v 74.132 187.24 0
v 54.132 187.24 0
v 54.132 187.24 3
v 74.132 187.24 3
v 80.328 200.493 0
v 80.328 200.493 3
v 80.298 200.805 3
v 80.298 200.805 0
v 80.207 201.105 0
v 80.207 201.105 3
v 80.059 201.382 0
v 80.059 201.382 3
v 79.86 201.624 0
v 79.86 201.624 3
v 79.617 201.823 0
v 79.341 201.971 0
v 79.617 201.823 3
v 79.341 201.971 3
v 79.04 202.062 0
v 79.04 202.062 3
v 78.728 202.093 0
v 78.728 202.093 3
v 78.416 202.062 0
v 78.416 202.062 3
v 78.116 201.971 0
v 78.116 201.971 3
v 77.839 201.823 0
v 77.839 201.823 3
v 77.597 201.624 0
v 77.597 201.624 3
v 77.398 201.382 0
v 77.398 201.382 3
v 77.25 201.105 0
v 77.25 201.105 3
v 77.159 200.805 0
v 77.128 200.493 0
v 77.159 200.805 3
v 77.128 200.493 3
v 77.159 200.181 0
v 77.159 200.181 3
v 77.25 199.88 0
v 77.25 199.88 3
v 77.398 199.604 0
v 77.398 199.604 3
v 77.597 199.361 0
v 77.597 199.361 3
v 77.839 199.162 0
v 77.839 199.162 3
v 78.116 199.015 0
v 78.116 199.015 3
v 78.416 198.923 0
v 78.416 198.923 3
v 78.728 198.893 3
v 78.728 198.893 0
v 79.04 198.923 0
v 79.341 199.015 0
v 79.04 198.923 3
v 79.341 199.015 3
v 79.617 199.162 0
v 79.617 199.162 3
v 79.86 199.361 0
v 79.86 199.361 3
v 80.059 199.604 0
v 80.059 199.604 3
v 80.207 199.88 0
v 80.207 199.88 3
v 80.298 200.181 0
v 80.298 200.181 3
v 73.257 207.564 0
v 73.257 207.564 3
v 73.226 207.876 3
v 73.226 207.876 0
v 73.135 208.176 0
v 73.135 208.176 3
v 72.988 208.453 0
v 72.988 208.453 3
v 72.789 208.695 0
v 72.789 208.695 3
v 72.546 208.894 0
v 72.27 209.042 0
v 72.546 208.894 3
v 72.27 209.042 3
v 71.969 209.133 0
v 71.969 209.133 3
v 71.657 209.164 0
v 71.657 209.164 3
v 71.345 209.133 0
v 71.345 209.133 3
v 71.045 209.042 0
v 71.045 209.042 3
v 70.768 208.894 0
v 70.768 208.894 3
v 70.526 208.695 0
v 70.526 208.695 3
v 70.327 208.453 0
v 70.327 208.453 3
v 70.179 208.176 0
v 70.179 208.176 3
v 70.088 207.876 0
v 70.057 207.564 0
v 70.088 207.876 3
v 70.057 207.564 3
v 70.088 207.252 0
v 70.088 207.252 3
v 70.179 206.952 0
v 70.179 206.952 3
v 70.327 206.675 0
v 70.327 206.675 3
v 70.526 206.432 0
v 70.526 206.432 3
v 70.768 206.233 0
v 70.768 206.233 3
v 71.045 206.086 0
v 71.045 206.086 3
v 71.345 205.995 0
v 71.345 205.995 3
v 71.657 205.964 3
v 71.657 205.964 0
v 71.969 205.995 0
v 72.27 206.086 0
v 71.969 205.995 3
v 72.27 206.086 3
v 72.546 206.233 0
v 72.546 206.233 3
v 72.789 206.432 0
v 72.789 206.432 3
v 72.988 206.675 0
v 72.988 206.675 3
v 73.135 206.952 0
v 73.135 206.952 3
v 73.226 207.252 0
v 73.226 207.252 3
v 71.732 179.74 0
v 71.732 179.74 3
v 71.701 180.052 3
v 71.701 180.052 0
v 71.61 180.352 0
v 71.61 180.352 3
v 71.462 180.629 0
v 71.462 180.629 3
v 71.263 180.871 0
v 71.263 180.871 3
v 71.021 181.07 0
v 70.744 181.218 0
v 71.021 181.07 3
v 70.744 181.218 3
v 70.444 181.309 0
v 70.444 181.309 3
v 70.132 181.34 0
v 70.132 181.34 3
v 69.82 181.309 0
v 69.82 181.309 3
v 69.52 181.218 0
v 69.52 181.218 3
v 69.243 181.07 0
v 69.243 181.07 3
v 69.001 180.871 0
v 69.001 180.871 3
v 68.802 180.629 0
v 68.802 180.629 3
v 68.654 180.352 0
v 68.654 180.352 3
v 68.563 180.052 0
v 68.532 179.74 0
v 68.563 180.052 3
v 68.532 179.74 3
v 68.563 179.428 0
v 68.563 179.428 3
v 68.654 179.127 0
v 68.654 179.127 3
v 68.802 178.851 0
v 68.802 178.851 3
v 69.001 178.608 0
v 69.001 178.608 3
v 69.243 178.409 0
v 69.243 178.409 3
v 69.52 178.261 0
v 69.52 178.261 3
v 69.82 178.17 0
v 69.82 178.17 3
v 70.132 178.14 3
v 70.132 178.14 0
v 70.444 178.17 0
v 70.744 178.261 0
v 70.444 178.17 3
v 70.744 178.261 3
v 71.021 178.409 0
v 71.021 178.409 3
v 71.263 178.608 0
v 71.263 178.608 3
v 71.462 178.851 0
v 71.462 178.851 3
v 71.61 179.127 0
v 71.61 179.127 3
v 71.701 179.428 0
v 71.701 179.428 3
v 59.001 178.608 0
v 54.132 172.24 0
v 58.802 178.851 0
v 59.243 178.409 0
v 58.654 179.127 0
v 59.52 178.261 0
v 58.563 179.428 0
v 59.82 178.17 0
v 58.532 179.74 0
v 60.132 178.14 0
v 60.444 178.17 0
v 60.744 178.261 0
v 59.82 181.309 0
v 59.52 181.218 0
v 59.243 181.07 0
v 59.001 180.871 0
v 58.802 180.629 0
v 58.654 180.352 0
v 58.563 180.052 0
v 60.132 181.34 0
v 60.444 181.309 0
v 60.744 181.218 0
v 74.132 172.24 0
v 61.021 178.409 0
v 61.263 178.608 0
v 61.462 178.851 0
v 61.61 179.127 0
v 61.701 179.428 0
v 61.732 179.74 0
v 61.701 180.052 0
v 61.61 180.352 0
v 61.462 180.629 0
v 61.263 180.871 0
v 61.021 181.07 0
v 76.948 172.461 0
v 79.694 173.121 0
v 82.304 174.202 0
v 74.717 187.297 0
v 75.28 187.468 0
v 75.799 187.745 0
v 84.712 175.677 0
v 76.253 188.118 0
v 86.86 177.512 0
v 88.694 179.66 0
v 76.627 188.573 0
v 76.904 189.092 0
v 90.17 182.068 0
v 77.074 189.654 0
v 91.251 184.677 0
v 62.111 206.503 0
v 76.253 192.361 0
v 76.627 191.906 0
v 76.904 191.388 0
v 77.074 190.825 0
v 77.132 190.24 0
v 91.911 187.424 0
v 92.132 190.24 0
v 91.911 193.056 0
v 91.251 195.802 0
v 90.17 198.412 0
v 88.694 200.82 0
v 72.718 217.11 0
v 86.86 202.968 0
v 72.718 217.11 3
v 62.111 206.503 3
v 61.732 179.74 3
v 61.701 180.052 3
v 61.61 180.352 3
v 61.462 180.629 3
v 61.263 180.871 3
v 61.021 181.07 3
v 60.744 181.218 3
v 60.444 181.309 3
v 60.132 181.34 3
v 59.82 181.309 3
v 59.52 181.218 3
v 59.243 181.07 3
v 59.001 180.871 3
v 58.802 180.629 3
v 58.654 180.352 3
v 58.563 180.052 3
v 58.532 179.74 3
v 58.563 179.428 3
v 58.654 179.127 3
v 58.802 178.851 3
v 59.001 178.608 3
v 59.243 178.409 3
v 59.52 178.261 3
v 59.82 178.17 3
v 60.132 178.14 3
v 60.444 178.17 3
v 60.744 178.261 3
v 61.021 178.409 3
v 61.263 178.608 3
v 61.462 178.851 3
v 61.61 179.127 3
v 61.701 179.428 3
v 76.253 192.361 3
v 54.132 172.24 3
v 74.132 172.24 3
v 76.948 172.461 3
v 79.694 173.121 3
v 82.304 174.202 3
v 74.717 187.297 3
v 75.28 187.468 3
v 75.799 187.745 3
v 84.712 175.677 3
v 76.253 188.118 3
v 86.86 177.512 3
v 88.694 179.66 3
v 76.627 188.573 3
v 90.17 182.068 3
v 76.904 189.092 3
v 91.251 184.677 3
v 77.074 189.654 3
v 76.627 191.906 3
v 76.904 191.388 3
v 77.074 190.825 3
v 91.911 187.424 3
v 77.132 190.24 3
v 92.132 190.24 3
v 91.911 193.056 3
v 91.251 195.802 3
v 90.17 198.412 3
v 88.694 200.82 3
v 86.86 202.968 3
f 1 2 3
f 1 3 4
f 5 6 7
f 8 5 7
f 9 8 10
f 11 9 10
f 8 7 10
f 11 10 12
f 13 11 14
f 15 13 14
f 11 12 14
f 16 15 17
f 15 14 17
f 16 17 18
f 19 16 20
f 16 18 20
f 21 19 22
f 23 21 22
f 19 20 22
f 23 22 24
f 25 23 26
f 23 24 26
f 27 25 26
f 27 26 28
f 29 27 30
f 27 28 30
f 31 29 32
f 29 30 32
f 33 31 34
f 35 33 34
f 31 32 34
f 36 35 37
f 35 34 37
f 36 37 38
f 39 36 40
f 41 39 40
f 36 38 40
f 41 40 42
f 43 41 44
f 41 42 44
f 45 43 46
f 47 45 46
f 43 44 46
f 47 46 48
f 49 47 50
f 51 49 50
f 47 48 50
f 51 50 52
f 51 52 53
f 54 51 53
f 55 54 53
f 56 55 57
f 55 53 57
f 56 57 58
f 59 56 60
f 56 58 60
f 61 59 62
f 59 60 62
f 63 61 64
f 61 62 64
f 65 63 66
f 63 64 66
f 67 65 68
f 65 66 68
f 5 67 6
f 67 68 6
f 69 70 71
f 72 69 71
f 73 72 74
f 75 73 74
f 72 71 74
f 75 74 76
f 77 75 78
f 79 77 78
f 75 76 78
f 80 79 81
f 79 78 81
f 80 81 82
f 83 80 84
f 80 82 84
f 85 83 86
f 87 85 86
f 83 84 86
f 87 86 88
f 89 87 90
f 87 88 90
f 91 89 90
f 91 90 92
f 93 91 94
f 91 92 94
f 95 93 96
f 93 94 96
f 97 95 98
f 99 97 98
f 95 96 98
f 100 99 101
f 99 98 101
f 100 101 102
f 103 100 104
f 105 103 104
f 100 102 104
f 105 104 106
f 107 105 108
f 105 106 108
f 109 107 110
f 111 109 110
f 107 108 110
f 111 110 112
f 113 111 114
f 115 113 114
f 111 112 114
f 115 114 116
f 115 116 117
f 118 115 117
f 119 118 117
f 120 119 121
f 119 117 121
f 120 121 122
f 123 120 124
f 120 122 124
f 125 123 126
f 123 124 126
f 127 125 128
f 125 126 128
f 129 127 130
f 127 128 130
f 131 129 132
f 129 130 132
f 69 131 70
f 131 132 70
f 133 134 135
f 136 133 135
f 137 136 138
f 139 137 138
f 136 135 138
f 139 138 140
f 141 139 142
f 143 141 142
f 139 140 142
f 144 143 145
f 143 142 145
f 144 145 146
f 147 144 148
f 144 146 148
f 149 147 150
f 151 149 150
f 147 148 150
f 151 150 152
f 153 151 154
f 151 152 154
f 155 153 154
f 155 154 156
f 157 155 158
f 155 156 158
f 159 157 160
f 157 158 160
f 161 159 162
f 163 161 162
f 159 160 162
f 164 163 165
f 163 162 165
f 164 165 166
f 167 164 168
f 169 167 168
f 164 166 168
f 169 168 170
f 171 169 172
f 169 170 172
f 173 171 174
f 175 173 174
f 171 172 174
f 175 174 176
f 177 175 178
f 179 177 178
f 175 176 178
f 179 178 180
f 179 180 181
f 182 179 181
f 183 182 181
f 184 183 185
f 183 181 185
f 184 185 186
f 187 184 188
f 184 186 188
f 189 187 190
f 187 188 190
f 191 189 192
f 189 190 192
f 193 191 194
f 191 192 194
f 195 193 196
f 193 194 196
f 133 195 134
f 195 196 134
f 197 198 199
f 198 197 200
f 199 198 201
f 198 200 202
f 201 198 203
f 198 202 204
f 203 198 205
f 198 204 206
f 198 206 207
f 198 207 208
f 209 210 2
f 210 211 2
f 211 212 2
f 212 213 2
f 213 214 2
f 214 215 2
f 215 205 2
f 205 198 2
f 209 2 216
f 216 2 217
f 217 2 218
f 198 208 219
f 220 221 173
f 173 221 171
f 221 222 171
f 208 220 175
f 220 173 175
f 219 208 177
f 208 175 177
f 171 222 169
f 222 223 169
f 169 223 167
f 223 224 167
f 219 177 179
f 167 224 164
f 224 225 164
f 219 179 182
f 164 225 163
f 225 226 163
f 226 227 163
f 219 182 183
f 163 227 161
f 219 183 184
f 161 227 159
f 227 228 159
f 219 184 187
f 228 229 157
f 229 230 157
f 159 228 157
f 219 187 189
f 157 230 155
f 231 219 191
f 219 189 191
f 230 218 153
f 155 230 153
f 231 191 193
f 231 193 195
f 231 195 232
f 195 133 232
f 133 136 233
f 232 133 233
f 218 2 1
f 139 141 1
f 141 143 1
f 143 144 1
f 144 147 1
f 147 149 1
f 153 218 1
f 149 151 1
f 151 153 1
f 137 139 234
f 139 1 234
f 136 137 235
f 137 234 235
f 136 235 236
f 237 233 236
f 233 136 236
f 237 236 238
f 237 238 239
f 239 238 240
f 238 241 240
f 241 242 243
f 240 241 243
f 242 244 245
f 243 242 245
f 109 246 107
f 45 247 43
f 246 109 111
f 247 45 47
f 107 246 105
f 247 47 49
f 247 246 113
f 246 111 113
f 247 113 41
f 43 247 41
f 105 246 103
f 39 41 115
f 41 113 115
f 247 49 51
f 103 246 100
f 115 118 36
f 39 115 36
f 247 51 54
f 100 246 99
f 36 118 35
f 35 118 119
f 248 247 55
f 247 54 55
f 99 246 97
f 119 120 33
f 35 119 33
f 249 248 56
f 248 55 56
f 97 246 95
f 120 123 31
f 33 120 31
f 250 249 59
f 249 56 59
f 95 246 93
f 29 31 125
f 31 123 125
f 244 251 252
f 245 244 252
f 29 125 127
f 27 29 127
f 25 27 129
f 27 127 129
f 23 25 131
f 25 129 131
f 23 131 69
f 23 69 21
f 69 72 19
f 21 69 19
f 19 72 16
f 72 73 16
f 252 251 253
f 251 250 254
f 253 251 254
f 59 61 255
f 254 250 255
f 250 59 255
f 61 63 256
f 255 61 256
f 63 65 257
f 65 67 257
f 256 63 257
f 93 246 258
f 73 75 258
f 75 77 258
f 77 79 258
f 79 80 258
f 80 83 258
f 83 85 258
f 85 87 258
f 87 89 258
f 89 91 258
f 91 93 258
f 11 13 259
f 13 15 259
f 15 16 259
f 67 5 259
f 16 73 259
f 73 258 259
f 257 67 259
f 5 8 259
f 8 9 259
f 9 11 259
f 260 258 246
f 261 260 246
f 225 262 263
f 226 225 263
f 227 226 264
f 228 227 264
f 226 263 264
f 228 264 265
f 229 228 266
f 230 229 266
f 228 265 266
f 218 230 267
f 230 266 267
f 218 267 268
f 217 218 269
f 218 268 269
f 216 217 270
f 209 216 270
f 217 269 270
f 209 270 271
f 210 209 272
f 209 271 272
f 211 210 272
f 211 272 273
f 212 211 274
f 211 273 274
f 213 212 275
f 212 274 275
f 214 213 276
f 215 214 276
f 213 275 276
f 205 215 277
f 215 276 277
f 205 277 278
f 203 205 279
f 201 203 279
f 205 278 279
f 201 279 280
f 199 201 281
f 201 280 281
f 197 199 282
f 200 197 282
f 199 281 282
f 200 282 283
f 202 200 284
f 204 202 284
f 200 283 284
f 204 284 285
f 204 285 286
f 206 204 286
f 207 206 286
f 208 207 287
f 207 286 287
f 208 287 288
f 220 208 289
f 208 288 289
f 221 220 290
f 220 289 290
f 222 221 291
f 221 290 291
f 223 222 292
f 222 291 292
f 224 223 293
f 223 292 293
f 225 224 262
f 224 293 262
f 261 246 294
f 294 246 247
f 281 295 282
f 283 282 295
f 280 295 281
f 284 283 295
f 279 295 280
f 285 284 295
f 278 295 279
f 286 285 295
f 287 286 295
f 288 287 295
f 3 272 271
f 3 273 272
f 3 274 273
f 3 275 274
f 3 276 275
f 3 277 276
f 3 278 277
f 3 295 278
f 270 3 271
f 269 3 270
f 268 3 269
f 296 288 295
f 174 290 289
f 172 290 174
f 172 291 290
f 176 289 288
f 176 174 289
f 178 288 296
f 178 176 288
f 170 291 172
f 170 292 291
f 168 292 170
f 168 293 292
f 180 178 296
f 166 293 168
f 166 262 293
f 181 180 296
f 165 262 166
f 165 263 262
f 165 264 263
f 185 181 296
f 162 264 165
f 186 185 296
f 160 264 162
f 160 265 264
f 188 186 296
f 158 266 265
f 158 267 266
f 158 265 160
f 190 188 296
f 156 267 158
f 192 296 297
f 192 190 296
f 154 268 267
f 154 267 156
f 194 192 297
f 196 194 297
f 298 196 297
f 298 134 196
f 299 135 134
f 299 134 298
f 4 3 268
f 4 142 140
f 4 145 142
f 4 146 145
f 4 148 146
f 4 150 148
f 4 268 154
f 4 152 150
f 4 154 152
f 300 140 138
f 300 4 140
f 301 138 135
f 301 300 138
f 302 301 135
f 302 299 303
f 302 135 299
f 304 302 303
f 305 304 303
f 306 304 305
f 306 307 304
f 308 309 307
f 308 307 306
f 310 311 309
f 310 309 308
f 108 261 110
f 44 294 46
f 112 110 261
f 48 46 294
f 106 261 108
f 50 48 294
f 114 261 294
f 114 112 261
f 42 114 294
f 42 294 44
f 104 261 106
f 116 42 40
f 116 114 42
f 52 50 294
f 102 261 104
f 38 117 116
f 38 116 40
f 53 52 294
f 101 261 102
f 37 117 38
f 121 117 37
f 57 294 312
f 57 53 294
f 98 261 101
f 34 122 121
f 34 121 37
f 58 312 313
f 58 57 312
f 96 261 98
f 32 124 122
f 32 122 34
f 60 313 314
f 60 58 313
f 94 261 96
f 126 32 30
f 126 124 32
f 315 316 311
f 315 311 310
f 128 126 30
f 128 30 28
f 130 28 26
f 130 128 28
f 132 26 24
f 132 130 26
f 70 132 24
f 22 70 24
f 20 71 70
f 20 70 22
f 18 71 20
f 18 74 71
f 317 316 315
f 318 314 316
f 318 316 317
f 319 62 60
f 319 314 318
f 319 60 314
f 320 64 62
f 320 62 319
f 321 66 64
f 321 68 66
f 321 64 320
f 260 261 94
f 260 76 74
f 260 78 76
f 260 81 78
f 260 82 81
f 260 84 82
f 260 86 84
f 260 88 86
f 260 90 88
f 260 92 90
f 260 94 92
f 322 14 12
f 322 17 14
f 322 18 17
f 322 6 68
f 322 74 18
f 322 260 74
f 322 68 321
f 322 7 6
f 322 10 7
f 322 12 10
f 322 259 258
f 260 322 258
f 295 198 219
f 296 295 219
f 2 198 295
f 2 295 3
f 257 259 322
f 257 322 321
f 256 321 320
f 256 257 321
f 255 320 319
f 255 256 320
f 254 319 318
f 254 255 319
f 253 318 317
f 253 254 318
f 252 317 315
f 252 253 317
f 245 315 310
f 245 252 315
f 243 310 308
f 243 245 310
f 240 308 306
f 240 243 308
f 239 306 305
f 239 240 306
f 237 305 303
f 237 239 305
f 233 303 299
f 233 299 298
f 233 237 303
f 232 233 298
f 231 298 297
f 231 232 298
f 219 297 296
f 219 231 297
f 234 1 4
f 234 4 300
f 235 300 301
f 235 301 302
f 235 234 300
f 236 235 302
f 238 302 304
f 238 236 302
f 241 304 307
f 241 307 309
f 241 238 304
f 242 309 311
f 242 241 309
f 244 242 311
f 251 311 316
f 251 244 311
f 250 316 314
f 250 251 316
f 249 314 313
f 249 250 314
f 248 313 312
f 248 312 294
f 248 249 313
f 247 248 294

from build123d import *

# Parameters (mm, degrees)
SKETCH_1_W          = 20
SKETCH_1_H          = 15
EXTRUDE_1_DEPTH     = 3
SKETCH_2_R          = 1.6
CUT_EXTRUDE_1_DEPTH = 3


with BuildPart() as part:
    # 草图1 → 凸台-拉伸1 (new body)
    with BuildSketch(Plane.XY):
        Polygon((62.111299198, 206.50315886), (76.253434822, 192.361023236), (86.86003654, 202.967624954), (72.717900916, 217.109760578), align=None)
        with BuildLine():
            ThreePointArc((86.86003654, 202.967624954), (90.761946064, 183.35140111), (74.132114478, 172.239702893))
            Line((74.132114478, 172.239702893), (74.132114478, 187.239702893))
            ThreePointArc((74.132114478, 187.239702893), (76.903753076, 189.091652596), (76.253434822, 192.361023236))
            Line((76.253434822, 192.361023236), (86.86003654, 202.967624954))
        make_face()
        with Locations((64.132114478, 179.739702893)):
            Rectangle(SKETCH_1_W, SKETCH_1_H)
    extrude(amount=EXTRUDE_1_DEPTH)

    # 草图2 → 切除-拉伸1 (cut)
    with BuildSketch(Plane.XY.offset(3)):
        with Locations((71.657240744, 207.563819032)):
            Circle(SKETCH_2_R)
        with Locations((78.728308556, 200.49275122)):
            Circle(SKETCH_2_R)
        with Locations((60.132114478, 179.739702893)):
            Circle(SKETCH_2_R)
        with Locations((70.132114478, 179.739702893)):
            Circle(SKETCH_2_R)
    extrude(amount=-CUT_EXTRUDE_1_DEPTH, mode=Mode.SUBTRACT)


solid = part.part
